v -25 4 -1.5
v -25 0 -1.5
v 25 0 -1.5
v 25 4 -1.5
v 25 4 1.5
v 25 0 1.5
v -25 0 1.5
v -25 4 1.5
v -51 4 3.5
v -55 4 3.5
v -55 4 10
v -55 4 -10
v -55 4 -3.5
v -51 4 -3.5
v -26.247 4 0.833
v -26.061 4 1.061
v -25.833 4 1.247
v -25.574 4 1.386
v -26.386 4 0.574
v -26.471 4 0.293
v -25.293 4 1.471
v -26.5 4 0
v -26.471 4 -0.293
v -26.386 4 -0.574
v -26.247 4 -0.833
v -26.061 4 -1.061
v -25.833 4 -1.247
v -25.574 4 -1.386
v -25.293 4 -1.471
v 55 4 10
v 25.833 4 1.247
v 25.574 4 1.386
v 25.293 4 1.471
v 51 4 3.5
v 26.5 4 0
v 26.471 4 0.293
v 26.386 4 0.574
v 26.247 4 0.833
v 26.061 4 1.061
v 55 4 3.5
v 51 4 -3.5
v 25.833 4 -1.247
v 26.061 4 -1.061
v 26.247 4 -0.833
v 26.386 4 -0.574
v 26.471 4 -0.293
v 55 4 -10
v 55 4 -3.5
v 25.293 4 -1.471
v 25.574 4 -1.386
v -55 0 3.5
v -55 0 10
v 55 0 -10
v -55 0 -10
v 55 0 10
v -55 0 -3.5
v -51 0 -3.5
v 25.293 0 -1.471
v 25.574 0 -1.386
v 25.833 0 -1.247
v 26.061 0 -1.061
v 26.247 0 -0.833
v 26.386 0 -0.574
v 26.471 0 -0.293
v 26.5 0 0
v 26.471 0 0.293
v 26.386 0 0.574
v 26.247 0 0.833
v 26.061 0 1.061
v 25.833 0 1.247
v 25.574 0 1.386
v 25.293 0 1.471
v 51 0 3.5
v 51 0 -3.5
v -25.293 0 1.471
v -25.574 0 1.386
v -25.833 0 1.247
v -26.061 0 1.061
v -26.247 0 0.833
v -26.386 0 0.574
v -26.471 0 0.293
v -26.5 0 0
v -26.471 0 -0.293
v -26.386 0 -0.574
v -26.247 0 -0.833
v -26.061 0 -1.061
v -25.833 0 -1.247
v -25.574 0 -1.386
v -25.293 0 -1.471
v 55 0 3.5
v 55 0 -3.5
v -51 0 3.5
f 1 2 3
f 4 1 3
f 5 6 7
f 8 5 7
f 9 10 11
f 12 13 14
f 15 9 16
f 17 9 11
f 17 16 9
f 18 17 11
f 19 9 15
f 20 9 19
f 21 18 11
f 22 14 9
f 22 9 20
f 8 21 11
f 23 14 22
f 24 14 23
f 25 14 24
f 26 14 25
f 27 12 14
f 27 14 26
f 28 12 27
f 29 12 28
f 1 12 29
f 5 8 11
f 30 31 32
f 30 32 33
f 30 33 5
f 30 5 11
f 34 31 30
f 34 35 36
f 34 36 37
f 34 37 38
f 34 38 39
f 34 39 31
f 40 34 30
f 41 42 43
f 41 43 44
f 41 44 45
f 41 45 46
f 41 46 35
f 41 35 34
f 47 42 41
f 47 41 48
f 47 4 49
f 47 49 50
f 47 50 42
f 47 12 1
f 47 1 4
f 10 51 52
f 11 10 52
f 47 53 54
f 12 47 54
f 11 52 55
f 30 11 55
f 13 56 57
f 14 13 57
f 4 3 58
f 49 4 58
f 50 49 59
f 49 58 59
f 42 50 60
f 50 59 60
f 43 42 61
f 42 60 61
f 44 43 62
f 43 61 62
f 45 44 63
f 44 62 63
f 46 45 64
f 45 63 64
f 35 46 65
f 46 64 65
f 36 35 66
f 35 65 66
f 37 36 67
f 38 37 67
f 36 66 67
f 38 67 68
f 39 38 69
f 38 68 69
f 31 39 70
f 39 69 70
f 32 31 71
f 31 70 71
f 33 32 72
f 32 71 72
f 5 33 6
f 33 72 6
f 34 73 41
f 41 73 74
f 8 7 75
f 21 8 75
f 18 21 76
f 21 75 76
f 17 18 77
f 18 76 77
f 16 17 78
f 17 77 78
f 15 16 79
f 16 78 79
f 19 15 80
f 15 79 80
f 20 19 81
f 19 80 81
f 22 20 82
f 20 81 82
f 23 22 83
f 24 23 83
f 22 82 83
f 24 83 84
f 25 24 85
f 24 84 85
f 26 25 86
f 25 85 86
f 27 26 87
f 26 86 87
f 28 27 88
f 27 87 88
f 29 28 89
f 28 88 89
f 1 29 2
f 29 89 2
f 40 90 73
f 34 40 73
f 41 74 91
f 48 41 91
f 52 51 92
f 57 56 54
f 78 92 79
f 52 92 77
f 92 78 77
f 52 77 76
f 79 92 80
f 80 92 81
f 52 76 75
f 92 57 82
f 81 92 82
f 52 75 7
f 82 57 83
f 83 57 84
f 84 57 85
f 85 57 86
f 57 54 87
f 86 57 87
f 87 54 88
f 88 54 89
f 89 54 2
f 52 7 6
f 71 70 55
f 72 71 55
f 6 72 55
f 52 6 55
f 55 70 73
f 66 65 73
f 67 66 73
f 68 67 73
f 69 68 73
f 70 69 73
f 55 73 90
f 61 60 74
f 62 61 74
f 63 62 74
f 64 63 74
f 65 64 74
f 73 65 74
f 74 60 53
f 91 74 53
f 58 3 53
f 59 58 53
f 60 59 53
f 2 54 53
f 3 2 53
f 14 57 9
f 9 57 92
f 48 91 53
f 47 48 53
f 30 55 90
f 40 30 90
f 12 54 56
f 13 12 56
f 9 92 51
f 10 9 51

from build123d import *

# Parameters (mm, degrees)
BOSS_EXTRUDE1_DEPTH = 4
SKETCH2_R           = 1.5
CUT_EXTRUDE2_DEPTH  = 4


with BuildPart() as part:
    # Sketch1 → Boss-Extrude1 (new body)
    with BuildSketch(Plane(origin=(0, 0, 0), x_dir=(1, 0, 0), z_dir=(0, 1, 0))):
        Polygon((55, 10), (-55, 10), (-55, 3.5), (-51, 3.5), (-51, -3.5), (-55, -3.5), (-55, -10), (55, -10), (55, -3.5), (51, -3.5), (51, 3.5), (55, 3.5), align=None)
    extrude(amount=BOSS_EXTRUDE1_DEPTH)

    # Sketch2 → Cut-Extrude2 (cut)
    with BuildSketch(Plane.XZ):
        with BuildLine():
            ThreePointArc((-23.5, 0), (-23.939339828, -1.060660172), (-25, -1.5))
            Line((-25, -1.5), (25, -1.5))
            ThreePointArc((25, -1.5), (23.5, 0), (25, 1.5))
            Line((25, 1.5), (-25, 1.5))
            ThreePointArc((-25, 1.5), (-23.939339828, 1.060660172), (-23.5, 0))
        make_face()
        with Locations((-25, 0)):
            Circle(SKETCH2_R)
        with Locations((25, 0)):
            Circle(SKETCH2_R)
    extrude(amount=-CUT_EXTRUDE2_DEPTH, mode=Mode.SUBTRACT)


solid = part.part
